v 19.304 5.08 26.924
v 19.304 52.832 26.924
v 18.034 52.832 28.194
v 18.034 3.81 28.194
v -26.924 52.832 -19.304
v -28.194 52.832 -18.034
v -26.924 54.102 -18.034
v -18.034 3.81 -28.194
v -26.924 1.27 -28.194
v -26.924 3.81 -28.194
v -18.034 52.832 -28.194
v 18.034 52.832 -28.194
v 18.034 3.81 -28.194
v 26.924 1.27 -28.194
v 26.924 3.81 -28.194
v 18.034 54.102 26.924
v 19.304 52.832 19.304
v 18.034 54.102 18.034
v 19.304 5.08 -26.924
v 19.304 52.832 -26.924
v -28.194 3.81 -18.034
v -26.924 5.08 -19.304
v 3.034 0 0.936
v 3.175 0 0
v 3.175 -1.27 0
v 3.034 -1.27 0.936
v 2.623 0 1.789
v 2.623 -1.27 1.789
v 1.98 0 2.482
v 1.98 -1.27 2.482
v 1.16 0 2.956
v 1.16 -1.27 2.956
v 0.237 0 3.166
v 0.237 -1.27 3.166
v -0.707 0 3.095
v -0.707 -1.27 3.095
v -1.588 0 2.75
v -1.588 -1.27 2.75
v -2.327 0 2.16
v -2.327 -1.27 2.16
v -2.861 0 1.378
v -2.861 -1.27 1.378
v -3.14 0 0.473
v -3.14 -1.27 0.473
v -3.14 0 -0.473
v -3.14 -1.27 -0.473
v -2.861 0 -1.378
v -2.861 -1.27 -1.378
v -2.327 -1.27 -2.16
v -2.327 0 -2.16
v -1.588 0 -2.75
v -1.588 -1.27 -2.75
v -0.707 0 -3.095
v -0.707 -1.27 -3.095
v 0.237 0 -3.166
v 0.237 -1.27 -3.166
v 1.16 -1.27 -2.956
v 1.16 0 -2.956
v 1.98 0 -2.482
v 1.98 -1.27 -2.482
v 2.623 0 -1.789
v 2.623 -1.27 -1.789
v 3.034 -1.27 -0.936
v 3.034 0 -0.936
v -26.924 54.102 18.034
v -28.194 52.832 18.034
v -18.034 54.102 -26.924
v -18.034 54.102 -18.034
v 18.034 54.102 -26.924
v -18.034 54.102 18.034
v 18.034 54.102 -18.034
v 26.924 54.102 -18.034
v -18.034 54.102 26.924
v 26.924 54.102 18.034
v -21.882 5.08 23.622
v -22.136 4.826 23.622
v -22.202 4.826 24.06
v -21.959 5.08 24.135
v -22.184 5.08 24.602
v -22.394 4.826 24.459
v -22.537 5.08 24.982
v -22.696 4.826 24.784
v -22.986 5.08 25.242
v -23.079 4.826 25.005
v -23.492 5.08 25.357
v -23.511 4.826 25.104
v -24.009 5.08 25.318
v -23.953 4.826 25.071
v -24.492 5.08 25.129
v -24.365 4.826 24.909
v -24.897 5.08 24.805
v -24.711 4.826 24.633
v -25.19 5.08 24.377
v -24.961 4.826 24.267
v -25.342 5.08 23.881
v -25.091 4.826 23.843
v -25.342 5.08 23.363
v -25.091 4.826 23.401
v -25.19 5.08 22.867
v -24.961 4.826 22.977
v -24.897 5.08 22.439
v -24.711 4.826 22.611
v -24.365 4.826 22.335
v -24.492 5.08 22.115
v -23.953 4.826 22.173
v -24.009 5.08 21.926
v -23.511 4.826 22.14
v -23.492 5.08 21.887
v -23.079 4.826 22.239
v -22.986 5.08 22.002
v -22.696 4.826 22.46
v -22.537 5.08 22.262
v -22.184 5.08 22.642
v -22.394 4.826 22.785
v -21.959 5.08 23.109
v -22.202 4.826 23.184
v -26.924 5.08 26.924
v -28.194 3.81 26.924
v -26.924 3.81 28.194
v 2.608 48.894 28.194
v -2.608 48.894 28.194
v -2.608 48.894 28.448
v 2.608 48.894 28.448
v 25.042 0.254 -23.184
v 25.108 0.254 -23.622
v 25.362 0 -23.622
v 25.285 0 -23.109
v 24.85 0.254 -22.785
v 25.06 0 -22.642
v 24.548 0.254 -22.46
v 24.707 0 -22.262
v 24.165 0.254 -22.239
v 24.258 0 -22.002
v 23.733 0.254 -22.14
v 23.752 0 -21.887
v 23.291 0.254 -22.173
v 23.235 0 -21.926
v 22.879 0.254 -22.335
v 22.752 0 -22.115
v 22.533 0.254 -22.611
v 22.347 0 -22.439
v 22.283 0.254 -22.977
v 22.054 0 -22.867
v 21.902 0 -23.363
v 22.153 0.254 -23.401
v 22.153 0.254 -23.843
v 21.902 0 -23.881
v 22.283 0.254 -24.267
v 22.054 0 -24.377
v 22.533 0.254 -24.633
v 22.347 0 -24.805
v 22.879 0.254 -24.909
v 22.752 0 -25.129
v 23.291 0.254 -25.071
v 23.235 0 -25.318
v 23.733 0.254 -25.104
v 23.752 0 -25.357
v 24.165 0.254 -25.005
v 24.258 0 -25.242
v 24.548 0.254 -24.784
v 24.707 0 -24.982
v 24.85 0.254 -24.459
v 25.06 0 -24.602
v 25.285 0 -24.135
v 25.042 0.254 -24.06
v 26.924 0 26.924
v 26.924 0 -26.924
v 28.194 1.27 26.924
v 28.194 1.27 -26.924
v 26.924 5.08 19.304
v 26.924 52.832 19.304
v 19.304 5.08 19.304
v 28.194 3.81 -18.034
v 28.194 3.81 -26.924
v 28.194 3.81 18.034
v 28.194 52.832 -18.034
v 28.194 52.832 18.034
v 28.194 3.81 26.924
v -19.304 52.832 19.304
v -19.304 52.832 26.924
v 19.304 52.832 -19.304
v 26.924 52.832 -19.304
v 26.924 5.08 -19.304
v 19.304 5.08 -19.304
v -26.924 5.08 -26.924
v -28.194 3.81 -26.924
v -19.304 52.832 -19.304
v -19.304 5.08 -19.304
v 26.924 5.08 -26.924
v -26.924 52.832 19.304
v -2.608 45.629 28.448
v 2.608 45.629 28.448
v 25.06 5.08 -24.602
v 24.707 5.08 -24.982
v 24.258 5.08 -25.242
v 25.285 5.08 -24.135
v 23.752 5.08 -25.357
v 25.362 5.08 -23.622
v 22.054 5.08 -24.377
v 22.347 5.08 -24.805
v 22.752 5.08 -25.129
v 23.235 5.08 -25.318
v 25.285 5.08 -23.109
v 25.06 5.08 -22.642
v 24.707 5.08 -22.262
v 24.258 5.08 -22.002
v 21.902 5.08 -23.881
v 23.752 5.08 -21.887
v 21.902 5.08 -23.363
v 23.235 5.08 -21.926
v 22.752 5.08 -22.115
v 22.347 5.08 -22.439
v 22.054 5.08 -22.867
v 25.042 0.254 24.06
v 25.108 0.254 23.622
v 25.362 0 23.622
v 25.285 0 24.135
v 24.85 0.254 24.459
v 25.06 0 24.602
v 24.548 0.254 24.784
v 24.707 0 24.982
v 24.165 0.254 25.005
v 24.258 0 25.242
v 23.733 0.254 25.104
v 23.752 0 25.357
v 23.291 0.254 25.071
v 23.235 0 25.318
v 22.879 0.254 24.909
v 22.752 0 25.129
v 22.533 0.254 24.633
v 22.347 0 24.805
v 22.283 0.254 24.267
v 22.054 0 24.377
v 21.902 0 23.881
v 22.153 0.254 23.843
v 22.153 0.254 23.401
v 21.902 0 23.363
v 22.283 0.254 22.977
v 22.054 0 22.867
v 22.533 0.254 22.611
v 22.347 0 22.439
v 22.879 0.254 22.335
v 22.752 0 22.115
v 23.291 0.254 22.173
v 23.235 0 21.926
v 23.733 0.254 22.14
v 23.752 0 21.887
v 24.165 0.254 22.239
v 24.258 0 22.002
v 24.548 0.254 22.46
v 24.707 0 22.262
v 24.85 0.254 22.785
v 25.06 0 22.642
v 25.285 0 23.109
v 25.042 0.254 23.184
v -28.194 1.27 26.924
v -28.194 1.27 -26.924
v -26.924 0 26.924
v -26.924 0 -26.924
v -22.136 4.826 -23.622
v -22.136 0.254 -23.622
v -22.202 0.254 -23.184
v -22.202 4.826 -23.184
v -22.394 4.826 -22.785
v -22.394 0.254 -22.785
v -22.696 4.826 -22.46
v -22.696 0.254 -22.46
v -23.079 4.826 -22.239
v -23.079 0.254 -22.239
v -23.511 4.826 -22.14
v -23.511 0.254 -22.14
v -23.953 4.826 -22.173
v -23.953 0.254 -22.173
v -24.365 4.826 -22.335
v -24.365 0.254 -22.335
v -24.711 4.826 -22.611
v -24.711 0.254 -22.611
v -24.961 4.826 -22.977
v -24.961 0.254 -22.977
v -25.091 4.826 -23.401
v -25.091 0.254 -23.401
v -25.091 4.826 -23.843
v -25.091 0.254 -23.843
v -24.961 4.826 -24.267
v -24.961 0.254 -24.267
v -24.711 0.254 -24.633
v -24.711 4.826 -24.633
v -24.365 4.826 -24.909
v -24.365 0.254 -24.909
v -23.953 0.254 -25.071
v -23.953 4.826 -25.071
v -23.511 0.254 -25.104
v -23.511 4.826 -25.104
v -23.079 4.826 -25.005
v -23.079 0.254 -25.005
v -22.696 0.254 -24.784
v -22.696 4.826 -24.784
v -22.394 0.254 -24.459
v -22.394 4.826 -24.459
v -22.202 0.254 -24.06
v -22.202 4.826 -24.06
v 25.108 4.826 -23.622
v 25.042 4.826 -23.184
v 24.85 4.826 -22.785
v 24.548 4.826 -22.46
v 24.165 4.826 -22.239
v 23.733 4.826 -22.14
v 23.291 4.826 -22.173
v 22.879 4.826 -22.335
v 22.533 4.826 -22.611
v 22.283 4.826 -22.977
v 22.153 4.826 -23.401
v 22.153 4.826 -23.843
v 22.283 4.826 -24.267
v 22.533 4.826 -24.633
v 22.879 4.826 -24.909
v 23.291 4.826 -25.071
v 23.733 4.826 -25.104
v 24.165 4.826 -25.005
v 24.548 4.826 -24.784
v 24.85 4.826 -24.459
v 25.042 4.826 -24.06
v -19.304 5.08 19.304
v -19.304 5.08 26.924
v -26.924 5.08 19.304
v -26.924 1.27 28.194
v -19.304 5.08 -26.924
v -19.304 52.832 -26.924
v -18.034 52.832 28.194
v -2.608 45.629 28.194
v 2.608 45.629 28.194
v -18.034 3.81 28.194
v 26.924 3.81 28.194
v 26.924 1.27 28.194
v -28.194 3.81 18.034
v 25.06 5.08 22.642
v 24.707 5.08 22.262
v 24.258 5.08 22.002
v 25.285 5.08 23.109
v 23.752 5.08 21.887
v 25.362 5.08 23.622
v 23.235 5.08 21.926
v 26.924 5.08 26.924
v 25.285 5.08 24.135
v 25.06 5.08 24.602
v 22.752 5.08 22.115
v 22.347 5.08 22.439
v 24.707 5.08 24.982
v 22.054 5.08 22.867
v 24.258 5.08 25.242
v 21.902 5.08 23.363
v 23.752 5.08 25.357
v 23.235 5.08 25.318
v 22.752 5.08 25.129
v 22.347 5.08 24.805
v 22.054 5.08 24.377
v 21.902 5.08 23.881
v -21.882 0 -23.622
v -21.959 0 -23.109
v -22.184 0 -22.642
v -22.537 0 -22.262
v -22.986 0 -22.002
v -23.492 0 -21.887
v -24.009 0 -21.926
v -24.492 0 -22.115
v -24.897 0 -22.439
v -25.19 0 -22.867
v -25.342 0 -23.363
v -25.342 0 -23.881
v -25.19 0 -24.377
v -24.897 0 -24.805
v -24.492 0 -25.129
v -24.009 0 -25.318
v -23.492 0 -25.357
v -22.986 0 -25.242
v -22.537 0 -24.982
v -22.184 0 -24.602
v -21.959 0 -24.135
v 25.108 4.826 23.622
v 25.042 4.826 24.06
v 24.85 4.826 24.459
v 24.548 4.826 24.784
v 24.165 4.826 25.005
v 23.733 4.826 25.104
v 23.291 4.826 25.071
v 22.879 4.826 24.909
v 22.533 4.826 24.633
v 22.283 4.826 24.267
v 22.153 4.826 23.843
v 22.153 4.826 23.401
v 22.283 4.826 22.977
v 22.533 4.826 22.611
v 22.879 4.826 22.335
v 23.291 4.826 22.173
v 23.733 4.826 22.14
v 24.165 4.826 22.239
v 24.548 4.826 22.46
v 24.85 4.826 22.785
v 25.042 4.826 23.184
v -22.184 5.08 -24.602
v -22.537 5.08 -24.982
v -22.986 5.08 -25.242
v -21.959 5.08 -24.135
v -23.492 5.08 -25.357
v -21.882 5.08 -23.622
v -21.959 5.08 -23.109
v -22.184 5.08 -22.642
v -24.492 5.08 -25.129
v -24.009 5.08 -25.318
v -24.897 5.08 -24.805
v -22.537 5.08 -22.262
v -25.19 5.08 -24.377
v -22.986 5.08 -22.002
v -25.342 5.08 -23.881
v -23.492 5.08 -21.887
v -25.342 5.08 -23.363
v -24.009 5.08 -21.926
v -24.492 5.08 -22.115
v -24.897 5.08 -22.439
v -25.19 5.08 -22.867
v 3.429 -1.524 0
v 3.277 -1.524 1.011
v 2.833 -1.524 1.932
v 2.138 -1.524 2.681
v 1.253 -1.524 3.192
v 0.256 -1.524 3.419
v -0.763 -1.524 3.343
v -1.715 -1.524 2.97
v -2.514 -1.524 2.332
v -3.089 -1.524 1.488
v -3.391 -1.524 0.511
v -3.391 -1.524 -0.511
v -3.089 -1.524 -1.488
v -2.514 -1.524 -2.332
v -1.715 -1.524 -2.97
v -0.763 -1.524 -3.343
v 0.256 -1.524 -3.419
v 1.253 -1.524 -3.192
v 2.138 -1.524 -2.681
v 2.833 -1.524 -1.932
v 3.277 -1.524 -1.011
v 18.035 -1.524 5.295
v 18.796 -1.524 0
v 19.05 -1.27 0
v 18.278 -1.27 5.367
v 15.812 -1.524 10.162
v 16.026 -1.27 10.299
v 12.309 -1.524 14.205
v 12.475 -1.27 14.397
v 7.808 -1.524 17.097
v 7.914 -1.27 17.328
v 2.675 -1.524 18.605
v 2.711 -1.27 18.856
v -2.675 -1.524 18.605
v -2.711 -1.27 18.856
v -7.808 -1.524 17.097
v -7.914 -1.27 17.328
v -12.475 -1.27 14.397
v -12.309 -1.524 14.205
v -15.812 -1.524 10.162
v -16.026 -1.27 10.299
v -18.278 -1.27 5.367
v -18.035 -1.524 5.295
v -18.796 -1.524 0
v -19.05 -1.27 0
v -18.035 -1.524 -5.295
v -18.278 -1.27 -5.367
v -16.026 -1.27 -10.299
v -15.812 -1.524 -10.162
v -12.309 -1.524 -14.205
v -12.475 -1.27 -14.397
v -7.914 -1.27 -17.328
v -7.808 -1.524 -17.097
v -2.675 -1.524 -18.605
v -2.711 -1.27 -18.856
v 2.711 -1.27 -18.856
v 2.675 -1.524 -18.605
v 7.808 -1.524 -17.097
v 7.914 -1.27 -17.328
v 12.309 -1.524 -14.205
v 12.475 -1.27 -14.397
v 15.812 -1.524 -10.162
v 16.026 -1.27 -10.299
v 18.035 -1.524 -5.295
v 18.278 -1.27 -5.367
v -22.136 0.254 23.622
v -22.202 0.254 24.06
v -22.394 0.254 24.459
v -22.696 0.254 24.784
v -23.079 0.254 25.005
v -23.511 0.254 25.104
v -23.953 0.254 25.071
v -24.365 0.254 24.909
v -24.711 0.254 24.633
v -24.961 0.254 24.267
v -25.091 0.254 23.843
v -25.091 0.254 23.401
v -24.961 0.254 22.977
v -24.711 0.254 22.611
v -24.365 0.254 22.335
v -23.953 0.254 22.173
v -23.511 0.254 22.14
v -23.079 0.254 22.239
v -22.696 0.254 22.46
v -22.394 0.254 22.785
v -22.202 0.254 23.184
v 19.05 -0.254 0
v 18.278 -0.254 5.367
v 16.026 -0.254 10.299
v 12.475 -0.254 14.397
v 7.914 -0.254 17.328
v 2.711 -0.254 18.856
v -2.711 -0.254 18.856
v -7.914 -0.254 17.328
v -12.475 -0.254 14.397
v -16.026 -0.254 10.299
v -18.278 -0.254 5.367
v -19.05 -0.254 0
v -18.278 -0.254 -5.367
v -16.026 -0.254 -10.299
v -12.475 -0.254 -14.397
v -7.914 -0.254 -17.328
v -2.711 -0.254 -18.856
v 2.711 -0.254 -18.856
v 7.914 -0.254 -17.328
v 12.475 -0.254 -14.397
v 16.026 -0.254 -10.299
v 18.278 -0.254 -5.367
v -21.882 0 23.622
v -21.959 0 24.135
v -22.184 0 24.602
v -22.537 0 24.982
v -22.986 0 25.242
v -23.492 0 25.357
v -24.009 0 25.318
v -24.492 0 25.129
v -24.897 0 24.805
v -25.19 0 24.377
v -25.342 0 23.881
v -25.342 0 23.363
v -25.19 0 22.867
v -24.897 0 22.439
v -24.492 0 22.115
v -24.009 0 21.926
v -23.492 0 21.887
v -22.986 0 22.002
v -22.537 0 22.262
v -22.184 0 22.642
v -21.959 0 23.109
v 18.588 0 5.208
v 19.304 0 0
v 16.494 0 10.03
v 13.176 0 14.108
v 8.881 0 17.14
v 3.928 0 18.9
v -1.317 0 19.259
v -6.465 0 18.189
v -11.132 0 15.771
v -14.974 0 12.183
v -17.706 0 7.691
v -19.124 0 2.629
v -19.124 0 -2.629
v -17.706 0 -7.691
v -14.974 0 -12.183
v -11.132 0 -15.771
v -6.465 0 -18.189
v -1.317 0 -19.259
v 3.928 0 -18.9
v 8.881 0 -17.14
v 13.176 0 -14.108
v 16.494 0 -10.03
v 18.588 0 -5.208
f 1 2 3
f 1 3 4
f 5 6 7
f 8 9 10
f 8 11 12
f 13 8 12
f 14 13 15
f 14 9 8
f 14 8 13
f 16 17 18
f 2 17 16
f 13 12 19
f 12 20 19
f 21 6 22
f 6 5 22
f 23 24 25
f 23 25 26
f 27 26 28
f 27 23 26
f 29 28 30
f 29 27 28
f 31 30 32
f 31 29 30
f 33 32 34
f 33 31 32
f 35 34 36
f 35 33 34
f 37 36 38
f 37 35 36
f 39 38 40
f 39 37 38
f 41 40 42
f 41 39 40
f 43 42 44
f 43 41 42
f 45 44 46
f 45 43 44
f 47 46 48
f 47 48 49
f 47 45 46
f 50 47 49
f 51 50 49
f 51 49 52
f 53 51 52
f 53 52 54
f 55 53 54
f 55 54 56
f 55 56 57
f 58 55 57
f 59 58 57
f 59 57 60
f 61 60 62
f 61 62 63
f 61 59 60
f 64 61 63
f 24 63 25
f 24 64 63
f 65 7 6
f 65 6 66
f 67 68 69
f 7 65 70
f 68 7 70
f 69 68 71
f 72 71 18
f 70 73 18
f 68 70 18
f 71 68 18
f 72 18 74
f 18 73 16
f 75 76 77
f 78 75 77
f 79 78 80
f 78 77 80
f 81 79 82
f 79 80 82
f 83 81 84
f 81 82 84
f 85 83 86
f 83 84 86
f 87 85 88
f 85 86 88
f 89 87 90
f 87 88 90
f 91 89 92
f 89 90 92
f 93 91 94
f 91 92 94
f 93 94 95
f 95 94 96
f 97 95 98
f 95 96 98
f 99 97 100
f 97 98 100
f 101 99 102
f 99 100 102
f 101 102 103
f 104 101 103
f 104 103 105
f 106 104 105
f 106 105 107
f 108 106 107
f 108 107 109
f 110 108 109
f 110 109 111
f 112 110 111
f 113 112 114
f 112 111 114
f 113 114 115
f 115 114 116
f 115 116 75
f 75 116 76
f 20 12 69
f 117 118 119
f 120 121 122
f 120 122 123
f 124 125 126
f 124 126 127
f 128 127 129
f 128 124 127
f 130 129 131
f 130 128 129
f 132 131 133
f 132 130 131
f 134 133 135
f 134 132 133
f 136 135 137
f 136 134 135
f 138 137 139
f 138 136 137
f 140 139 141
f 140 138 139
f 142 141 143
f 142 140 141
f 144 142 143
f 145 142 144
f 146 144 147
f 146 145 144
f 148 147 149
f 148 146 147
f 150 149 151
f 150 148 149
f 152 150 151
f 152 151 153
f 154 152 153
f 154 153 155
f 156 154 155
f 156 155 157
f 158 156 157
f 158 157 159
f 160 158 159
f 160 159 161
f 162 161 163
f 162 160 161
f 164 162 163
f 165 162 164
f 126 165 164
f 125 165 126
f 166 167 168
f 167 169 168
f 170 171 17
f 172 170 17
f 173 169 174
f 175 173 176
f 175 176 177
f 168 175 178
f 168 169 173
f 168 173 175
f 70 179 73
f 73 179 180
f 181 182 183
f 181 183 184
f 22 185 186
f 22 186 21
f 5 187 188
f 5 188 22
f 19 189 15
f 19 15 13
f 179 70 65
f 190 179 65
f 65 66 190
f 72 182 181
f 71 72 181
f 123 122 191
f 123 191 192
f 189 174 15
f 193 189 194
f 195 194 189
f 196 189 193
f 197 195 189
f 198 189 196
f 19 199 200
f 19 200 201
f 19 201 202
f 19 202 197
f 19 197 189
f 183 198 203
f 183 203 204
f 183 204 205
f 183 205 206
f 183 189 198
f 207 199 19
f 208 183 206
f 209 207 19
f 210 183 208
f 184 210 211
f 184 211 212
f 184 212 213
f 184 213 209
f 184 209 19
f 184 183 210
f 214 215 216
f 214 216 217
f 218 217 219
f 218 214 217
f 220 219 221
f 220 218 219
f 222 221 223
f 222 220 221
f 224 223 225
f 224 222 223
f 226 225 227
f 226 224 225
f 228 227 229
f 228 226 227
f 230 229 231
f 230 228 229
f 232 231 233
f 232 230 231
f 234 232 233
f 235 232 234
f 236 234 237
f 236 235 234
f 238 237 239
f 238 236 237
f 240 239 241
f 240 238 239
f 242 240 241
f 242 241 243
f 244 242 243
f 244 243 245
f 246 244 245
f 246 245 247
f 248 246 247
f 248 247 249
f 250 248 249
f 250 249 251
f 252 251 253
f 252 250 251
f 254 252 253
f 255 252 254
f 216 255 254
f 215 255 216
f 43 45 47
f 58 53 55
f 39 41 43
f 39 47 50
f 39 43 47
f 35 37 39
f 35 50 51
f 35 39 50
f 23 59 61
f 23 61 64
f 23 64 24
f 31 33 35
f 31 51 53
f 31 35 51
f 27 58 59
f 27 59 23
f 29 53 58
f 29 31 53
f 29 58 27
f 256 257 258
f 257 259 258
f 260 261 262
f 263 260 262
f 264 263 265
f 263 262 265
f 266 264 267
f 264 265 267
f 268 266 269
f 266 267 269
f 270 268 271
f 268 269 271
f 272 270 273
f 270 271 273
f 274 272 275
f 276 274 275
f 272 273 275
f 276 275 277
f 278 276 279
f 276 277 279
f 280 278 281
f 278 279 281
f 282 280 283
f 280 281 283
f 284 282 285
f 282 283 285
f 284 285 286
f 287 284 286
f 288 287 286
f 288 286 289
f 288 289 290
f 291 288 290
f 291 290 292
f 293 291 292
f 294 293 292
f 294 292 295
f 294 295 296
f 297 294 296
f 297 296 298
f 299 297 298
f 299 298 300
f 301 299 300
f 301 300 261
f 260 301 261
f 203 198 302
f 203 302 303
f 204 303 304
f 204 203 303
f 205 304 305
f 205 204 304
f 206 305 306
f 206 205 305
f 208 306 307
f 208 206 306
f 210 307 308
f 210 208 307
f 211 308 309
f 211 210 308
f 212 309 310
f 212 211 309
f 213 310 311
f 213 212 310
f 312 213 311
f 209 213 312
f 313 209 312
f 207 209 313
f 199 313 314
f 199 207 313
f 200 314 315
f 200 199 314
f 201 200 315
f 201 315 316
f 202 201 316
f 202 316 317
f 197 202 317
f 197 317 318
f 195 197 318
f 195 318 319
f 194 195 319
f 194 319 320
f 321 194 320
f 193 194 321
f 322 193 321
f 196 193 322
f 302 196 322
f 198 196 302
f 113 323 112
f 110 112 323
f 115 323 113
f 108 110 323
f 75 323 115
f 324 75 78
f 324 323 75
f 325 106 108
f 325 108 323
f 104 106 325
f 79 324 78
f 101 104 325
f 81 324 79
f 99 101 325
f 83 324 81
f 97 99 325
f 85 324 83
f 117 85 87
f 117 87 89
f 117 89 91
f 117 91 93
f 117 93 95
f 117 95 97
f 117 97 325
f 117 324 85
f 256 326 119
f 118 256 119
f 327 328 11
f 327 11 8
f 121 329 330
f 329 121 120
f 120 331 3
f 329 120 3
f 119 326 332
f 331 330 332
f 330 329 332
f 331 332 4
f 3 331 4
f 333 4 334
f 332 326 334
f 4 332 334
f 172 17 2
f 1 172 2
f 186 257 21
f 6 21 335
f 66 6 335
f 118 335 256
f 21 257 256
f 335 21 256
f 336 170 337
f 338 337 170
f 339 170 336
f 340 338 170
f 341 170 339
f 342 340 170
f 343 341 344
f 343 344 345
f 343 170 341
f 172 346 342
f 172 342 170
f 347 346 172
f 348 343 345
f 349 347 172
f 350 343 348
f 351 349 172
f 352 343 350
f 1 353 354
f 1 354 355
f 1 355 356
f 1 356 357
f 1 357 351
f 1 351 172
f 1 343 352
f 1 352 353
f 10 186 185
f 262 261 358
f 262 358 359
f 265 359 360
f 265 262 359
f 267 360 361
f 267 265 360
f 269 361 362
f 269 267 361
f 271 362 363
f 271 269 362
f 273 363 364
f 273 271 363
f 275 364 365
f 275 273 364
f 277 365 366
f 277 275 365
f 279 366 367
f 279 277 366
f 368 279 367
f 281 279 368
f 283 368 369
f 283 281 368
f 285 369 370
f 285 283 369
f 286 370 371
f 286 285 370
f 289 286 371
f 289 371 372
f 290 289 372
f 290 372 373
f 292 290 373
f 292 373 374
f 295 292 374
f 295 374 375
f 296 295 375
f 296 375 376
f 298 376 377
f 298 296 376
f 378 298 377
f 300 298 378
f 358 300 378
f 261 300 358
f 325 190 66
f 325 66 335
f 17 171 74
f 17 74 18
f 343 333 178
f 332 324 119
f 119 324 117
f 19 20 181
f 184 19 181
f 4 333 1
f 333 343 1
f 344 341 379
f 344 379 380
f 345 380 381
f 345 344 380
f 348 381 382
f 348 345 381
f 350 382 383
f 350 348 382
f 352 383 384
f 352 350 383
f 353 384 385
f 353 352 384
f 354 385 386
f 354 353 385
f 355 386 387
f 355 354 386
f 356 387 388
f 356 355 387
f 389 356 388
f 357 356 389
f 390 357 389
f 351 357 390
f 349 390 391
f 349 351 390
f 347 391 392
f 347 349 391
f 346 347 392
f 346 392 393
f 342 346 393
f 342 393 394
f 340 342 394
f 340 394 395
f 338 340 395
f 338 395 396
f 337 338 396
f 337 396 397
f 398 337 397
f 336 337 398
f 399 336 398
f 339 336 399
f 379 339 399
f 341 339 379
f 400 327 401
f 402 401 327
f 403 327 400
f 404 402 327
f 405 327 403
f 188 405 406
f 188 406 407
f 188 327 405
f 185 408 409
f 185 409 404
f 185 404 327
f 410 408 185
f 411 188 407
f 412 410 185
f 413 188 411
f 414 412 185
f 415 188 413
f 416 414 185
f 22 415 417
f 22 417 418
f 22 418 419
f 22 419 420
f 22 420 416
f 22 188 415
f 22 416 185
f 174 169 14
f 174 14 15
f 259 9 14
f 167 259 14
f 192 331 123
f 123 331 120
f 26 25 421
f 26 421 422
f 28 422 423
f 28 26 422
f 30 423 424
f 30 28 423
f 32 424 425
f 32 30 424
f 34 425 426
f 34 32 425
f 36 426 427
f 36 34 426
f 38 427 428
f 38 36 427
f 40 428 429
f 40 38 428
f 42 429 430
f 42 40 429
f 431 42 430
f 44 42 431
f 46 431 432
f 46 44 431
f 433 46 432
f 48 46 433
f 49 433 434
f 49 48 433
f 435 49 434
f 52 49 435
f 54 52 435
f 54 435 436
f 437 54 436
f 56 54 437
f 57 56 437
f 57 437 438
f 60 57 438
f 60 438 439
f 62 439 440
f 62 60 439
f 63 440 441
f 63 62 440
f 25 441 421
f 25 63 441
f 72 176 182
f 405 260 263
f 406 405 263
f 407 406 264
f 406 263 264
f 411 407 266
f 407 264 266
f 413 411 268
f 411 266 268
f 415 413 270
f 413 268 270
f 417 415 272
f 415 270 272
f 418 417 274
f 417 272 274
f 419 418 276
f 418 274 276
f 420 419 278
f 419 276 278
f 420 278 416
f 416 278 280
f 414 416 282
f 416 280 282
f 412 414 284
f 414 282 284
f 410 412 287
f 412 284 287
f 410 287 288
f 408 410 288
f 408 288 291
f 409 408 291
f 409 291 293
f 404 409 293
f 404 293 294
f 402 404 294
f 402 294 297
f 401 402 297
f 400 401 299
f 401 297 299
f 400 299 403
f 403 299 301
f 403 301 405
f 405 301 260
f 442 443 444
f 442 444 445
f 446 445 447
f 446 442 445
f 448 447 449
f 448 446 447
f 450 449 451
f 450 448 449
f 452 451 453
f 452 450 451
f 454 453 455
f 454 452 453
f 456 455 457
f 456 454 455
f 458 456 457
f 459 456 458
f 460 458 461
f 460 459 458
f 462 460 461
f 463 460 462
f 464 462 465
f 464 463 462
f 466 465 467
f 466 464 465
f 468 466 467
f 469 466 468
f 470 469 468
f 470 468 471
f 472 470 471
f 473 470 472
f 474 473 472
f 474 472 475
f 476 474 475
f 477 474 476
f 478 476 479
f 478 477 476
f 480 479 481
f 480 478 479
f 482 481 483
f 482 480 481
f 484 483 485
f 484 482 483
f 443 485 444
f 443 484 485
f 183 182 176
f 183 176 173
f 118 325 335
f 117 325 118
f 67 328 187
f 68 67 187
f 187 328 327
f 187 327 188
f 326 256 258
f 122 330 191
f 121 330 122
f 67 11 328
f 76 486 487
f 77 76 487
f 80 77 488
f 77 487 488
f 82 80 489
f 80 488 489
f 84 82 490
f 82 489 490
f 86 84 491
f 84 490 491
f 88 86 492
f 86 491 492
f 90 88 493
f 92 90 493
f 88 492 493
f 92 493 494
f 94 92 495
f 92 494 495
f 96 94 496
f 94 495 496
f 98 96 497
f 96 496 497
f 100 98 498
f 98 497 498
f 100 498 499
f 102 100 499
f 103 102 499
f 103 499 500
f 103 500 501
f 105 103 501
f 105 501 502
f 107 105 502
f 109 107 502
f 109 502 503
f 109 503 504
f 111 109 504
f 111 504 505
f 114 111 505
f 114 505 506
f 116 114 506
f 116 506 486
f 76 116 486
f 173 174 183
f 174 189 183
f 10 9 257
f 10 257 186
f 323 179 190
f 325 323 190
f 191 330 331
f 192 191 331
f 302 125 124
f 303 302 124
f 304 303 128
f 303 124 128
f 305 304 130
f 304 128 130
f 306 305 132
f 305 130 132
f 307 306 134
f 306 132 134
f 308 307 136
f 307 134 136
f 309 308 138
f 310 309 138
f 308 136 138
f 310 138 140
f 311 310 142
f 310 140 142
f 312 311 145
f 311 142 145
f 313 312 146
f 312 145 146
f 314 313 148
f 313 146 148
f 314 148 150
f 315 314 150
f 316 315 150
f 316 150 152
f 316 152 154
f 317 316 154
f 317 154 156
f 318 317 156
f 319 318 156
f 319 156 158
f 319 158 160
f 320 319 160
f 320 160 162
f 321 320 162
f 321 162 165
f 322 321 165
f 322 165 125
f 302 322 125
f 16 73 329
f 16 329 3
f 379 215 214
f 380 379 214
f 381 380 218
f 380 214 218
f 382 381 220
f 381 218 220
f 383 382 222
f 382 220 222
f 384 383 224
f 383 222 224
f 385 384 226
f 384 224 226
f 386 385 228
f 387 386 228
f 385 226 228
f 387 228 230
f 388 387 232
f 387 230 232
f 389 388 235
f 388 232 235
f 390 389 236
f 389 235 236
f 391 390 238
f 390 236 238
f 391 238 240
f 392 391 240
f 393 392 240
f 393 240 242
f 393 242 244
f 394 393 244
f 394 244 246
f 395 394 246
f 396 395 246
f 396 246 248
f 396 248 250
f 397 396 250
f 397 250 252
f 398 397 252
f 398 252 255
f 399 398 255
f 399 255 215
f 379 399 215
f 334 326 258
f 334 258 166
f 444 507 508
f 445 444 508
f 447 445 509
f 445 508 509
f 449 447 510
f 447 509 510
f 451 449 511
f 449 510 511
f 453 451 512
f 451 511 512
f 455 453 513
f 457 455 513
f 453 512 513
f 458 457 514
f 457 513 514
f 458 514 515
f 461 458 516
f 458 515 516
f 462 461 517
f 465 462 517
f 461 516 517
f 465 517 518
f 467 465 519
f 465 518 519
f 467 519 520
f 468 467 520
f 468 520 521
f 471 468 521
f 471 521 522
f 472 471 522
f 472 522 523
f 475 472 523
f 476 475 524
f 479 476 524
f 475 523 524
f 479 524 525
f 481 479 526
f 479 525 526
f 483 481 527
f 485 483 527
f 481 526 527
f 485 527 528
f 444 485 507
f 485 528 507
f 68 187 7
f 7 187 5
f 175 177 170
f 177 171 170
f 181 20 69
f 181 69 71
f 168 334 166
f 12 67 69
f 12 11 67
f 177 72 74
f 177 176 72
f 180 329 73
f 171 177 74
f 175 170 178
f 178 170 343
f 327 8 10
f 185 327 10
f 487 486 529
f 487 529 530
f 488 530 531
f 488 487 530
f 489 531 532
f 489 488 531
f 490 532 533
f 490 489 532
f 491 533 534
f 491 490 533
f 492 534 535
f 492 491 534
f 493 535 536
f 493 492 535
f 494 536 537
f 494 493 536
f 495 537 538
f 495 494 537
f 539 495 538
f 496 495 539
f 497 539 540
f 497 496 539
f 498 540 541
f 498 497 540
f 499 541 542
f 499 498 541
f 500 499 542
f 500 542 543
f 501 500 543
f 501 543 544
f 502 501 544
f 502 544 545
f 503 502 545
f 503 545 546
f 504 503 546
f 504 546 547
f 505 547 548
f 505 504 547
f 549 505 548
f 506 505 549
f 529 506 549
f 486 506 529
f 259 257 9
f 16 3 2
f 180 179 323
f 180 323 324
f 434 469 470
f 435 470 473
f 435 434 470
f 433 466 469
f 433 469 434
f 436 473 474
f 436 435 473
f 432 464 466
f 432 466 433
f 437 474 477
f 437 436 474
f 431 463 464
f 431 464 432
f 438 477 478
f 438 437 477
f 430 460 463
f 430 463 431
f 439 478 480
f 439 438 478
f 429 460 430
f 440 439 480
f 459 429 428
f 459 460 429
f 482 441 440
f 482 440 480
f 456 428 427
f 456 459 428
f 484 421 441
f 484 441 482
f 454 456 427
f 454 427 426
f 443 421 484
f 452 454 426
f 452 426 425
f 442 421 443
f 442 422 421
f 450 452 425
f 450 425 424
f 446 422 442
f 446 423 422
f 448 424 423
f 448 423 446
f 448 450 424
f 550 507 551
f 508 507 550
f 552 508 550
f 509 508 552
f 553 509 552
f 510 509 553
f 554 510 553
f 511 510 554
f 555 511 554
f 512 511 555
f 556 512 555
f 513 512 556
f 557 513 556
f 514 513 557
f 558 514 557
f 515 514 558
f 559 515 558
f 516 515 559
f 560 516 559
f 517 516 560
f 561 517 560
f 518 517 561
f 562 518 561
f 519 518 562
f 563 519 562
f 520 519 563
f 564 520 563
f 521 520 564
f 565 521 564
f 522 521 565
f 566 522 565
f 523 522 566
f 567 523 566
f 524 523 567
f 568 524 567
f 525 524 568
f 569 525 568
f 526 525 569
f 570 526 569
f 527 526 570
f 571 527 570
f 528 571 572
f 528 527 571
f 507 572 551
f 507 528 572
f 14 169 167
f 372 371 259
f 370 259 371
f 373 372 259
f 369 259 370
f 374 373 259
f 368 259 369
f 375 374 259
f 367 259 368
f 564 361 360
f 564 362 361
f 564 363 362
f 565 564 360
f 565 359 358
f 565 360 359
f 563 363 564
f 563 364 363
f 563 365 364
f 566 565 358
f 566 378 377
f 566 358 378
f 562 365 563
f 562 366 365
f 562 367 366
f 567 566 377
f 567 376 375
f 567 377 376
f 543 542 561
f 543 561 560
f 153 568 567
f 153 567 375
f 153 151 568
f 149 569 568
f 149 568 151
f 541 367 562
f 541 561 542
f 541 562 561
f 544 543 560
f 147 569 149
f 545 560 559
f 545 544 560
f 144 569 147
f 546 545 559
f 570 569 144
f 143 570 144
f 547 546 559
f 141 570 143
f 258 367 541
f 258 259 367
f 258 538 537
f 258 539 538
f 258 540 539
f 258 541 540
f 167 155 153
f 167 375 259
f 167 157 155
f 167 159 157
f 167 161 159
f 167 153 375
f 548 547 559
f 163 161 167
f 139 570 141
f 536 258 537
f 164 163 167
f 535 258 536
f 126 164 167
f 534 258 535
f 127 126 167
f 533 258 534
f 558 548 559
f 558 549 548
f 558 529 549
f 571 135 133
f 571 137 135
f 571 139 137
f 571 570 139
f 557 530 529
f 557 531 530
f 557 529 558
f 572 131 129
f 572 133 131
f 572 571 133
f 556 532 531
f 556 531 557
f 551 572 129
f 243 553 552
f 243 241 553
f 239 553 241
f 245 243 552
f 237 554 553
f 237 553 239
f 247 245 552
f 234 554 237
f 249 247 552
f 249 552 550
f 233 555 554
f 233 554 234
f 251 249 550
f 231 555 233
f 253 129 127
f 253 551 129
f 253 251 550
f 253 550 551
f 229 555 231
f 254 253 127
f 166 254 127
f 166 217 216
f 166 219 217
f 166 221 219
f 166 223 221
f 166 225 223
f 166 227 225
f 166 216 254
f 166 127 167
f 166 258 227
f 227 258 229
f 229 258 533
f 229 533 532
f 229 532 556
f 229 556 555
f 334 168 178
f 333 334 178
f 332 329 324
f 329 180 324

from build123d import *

# Parameters (mm, degrees)
F0_W      = 56.388
F0_H      = 56.388
F0_R      = 1.4859
F0_R_2    = 19.05
F0_R_3    = 3.175
F1_DEPTH  = 54.102
F2_DEPTH  = 1.524
F3_DEPTH  = 20.32
F5_DEPTH  = 12.7
F6_W      = 8.89
F6_H      = 8.89
F7_DEPTH  = 49.022
F8_SIZE   = 1.27
F9_SIZE   = 0.254
F9_2_SIZE = 0.254
F10_W     = 5.2164322697
F10_H     = 3.265157342
F11_DEPTH = 0.254


with BuildPart() as f1:
    # F0 (on Front) → F1 (new body)
    with BuildSketch(Plane.XZ):
        Rectangle(F0_W, F0_H)
        with Locations((-23.622, -23.622)):
            Circle(F0_R, mode=Mode.SUBTRACT)
        with Locations((23.622, -23.622)):
            Circle(F0_R, mode=Mode.SUBTRACT)
        with Locations((-23.622, 23.622)):
            Circle(F0_R, mode=Mode.SUBTRACT)
        Circle(F0_R_2, mode=Mode.SUBTRACT)
        with Locations((23.622, 23.622)):
            Circle(F0_R, mode=Mode.SUBTRACT)
        Circle(F0_R_2)
        Circle(F0_R_3, mode=Mode.SUBTRACT)
        Circle(F0_R_3)
    extrude(amount=-F1_DEPTH)

    # F0 (on Front) → F2 (join)
    with BuildSketch(Plane.XZ):
        Circle(F0_R_2)
        Circle(F0_R_3, mode=Mode.SUBTRACT)
    extrude(amount=F2_DEPTH)

    # F6 (on face) → F7 (cut)
    with BuildSketch(Plane(origin=(0, 54.102, 0), x_dir=(-1, 0, 0), z_dir=(0, 1, 0))):
        with Locations((-23.749, 23.749)):
            Rectangle(F6_W, F6_H)
        with Locations((23.749, 23.749)):
            Rectangle(F6_W, F6_H)
        with Locations((23.749, -23.749)):
            Rectangle(F6_W, F6_H)
        with Locations((-23.749, -23.749)):
            Rectangle(F6_W, F6_H)
    extrude(amount=-F7_DEPTH, mode=Mode.SUBTRACT)

    # F8
    f8_edges = [f1.edges().sort_by_distance(p)[0] for p in [
        (-28.194, 0, 0),
        (-28.194, 2.54, -28.194),
        (-28.194, 5.08, -23.749),
        (-28.194, 29.591, -19.304),
        (-28.194, 54.102, 0),
        (-28.194, 29.591, 19.304),
        (-28.194, 5.08, 23.749),
        (-28.194, 2.54, 28.194),
        (0, 0, 28.194),
        (-23.749, 5.08, 28.194),
        (-19.304, 29.591, 28.194),
        (0, 54.102, 28.194),
        (19.304, 29.591, 28.194),
        (23.749, 5.08, 28.194),
        (28.194, 2.54, 28.194),
        (28.194, 0, 0),
        (28.194, 5.08, 23.749),
        (28.194, 29.591, 19.304),
        (28.194, 54.102, 0),
        (28.194, 29.591, -19.304),
        (28.194, 5.08, -23.749),
        (28.194, 2.54, -28.194),
        (0, 0, -28.194),
        (23.749, 5.08, -28.194),
        (19.304, 29.591, -28.194),
        (0, 54.102, -28.194),
        (-19.304, 29.591, -28.194),
        (-23.749, 5.08, -28.194),
        (23.749, 54.102, -19.304),
        (19.304, 54.102, -23.749),
        (-19.304, 54.102, -23.749),
        (-23.749, 54.102, -19.304),
        (-23.749, 54.102, 19.304),
        (-19.304, 54.102, 23.749),
        (19.304, 54.102, 23.749),
        (23.749, 54.102, 19.304),
    ]]
    chamfer(f8_edges, length=F8_SIZE)

    # F9
    f9_edges = [f1.edges().sort_by_distance(p)[0] for p in [
        (-25.1079, 5.08, 23.622),
        (-25.1079, 5.08, -23.622),
        (22.1361, 5.08, 23.622),
        (22.1361, 5.08, -23.622),
        (22.1361, 0, -23.622),
        (22.1361, 0, 23.622),
        (-25.1079, 0, 23.622),
        (-25.1079, 0, -23.622),
        (-19.05, 0, 0),
        (-19.05, -1.524, 0),
        (-3.175, -1.524, 0),
    ]]
    chamfer(f9_edges, length=F9_SIZE)

    # F10 (on face) → F11 (join)
    with BuildSketch(Plane.XY.offset(28.194)):
        with Locations((0, 47.2612604499)):
            Rectangle(F10_W, F10_H)
    extrude(amount=F11_DEPTH)


with BuildPart() as f3:
    # F0 (on Front) → F3 (new body)
    with BuildSketch(Plane.XZ):
        Circle(F0_R_3)
    extrude(amount=F3_DEPTH)

    # F4 (on face) → F5 (cut)
    with BuildSketch(Plane.XZ.offset(20.32)):
        with BuildLine():
            ThreePointArc((1.7989226109, 2.6162), (0, 3.175), (-1.7989226109, 2.6162))
            Line((-1.7989226109, 2.6162), (1.7989226109, 2.6162))
        make_face()
    extrude(amount=-F5_DEPTH, mode=Mode.SUBTRACT)

    # F9#2
    f9_2_edges = [f3.edges().sort_by_distance(p)[0] for p in [
        (-1.478013, -20.32, -2.81),
        (0, -20.32, 2.6162),
    ]]
    chamfer(f9_2_edges, length=F9_2_SIZE)


solid = f1.part
